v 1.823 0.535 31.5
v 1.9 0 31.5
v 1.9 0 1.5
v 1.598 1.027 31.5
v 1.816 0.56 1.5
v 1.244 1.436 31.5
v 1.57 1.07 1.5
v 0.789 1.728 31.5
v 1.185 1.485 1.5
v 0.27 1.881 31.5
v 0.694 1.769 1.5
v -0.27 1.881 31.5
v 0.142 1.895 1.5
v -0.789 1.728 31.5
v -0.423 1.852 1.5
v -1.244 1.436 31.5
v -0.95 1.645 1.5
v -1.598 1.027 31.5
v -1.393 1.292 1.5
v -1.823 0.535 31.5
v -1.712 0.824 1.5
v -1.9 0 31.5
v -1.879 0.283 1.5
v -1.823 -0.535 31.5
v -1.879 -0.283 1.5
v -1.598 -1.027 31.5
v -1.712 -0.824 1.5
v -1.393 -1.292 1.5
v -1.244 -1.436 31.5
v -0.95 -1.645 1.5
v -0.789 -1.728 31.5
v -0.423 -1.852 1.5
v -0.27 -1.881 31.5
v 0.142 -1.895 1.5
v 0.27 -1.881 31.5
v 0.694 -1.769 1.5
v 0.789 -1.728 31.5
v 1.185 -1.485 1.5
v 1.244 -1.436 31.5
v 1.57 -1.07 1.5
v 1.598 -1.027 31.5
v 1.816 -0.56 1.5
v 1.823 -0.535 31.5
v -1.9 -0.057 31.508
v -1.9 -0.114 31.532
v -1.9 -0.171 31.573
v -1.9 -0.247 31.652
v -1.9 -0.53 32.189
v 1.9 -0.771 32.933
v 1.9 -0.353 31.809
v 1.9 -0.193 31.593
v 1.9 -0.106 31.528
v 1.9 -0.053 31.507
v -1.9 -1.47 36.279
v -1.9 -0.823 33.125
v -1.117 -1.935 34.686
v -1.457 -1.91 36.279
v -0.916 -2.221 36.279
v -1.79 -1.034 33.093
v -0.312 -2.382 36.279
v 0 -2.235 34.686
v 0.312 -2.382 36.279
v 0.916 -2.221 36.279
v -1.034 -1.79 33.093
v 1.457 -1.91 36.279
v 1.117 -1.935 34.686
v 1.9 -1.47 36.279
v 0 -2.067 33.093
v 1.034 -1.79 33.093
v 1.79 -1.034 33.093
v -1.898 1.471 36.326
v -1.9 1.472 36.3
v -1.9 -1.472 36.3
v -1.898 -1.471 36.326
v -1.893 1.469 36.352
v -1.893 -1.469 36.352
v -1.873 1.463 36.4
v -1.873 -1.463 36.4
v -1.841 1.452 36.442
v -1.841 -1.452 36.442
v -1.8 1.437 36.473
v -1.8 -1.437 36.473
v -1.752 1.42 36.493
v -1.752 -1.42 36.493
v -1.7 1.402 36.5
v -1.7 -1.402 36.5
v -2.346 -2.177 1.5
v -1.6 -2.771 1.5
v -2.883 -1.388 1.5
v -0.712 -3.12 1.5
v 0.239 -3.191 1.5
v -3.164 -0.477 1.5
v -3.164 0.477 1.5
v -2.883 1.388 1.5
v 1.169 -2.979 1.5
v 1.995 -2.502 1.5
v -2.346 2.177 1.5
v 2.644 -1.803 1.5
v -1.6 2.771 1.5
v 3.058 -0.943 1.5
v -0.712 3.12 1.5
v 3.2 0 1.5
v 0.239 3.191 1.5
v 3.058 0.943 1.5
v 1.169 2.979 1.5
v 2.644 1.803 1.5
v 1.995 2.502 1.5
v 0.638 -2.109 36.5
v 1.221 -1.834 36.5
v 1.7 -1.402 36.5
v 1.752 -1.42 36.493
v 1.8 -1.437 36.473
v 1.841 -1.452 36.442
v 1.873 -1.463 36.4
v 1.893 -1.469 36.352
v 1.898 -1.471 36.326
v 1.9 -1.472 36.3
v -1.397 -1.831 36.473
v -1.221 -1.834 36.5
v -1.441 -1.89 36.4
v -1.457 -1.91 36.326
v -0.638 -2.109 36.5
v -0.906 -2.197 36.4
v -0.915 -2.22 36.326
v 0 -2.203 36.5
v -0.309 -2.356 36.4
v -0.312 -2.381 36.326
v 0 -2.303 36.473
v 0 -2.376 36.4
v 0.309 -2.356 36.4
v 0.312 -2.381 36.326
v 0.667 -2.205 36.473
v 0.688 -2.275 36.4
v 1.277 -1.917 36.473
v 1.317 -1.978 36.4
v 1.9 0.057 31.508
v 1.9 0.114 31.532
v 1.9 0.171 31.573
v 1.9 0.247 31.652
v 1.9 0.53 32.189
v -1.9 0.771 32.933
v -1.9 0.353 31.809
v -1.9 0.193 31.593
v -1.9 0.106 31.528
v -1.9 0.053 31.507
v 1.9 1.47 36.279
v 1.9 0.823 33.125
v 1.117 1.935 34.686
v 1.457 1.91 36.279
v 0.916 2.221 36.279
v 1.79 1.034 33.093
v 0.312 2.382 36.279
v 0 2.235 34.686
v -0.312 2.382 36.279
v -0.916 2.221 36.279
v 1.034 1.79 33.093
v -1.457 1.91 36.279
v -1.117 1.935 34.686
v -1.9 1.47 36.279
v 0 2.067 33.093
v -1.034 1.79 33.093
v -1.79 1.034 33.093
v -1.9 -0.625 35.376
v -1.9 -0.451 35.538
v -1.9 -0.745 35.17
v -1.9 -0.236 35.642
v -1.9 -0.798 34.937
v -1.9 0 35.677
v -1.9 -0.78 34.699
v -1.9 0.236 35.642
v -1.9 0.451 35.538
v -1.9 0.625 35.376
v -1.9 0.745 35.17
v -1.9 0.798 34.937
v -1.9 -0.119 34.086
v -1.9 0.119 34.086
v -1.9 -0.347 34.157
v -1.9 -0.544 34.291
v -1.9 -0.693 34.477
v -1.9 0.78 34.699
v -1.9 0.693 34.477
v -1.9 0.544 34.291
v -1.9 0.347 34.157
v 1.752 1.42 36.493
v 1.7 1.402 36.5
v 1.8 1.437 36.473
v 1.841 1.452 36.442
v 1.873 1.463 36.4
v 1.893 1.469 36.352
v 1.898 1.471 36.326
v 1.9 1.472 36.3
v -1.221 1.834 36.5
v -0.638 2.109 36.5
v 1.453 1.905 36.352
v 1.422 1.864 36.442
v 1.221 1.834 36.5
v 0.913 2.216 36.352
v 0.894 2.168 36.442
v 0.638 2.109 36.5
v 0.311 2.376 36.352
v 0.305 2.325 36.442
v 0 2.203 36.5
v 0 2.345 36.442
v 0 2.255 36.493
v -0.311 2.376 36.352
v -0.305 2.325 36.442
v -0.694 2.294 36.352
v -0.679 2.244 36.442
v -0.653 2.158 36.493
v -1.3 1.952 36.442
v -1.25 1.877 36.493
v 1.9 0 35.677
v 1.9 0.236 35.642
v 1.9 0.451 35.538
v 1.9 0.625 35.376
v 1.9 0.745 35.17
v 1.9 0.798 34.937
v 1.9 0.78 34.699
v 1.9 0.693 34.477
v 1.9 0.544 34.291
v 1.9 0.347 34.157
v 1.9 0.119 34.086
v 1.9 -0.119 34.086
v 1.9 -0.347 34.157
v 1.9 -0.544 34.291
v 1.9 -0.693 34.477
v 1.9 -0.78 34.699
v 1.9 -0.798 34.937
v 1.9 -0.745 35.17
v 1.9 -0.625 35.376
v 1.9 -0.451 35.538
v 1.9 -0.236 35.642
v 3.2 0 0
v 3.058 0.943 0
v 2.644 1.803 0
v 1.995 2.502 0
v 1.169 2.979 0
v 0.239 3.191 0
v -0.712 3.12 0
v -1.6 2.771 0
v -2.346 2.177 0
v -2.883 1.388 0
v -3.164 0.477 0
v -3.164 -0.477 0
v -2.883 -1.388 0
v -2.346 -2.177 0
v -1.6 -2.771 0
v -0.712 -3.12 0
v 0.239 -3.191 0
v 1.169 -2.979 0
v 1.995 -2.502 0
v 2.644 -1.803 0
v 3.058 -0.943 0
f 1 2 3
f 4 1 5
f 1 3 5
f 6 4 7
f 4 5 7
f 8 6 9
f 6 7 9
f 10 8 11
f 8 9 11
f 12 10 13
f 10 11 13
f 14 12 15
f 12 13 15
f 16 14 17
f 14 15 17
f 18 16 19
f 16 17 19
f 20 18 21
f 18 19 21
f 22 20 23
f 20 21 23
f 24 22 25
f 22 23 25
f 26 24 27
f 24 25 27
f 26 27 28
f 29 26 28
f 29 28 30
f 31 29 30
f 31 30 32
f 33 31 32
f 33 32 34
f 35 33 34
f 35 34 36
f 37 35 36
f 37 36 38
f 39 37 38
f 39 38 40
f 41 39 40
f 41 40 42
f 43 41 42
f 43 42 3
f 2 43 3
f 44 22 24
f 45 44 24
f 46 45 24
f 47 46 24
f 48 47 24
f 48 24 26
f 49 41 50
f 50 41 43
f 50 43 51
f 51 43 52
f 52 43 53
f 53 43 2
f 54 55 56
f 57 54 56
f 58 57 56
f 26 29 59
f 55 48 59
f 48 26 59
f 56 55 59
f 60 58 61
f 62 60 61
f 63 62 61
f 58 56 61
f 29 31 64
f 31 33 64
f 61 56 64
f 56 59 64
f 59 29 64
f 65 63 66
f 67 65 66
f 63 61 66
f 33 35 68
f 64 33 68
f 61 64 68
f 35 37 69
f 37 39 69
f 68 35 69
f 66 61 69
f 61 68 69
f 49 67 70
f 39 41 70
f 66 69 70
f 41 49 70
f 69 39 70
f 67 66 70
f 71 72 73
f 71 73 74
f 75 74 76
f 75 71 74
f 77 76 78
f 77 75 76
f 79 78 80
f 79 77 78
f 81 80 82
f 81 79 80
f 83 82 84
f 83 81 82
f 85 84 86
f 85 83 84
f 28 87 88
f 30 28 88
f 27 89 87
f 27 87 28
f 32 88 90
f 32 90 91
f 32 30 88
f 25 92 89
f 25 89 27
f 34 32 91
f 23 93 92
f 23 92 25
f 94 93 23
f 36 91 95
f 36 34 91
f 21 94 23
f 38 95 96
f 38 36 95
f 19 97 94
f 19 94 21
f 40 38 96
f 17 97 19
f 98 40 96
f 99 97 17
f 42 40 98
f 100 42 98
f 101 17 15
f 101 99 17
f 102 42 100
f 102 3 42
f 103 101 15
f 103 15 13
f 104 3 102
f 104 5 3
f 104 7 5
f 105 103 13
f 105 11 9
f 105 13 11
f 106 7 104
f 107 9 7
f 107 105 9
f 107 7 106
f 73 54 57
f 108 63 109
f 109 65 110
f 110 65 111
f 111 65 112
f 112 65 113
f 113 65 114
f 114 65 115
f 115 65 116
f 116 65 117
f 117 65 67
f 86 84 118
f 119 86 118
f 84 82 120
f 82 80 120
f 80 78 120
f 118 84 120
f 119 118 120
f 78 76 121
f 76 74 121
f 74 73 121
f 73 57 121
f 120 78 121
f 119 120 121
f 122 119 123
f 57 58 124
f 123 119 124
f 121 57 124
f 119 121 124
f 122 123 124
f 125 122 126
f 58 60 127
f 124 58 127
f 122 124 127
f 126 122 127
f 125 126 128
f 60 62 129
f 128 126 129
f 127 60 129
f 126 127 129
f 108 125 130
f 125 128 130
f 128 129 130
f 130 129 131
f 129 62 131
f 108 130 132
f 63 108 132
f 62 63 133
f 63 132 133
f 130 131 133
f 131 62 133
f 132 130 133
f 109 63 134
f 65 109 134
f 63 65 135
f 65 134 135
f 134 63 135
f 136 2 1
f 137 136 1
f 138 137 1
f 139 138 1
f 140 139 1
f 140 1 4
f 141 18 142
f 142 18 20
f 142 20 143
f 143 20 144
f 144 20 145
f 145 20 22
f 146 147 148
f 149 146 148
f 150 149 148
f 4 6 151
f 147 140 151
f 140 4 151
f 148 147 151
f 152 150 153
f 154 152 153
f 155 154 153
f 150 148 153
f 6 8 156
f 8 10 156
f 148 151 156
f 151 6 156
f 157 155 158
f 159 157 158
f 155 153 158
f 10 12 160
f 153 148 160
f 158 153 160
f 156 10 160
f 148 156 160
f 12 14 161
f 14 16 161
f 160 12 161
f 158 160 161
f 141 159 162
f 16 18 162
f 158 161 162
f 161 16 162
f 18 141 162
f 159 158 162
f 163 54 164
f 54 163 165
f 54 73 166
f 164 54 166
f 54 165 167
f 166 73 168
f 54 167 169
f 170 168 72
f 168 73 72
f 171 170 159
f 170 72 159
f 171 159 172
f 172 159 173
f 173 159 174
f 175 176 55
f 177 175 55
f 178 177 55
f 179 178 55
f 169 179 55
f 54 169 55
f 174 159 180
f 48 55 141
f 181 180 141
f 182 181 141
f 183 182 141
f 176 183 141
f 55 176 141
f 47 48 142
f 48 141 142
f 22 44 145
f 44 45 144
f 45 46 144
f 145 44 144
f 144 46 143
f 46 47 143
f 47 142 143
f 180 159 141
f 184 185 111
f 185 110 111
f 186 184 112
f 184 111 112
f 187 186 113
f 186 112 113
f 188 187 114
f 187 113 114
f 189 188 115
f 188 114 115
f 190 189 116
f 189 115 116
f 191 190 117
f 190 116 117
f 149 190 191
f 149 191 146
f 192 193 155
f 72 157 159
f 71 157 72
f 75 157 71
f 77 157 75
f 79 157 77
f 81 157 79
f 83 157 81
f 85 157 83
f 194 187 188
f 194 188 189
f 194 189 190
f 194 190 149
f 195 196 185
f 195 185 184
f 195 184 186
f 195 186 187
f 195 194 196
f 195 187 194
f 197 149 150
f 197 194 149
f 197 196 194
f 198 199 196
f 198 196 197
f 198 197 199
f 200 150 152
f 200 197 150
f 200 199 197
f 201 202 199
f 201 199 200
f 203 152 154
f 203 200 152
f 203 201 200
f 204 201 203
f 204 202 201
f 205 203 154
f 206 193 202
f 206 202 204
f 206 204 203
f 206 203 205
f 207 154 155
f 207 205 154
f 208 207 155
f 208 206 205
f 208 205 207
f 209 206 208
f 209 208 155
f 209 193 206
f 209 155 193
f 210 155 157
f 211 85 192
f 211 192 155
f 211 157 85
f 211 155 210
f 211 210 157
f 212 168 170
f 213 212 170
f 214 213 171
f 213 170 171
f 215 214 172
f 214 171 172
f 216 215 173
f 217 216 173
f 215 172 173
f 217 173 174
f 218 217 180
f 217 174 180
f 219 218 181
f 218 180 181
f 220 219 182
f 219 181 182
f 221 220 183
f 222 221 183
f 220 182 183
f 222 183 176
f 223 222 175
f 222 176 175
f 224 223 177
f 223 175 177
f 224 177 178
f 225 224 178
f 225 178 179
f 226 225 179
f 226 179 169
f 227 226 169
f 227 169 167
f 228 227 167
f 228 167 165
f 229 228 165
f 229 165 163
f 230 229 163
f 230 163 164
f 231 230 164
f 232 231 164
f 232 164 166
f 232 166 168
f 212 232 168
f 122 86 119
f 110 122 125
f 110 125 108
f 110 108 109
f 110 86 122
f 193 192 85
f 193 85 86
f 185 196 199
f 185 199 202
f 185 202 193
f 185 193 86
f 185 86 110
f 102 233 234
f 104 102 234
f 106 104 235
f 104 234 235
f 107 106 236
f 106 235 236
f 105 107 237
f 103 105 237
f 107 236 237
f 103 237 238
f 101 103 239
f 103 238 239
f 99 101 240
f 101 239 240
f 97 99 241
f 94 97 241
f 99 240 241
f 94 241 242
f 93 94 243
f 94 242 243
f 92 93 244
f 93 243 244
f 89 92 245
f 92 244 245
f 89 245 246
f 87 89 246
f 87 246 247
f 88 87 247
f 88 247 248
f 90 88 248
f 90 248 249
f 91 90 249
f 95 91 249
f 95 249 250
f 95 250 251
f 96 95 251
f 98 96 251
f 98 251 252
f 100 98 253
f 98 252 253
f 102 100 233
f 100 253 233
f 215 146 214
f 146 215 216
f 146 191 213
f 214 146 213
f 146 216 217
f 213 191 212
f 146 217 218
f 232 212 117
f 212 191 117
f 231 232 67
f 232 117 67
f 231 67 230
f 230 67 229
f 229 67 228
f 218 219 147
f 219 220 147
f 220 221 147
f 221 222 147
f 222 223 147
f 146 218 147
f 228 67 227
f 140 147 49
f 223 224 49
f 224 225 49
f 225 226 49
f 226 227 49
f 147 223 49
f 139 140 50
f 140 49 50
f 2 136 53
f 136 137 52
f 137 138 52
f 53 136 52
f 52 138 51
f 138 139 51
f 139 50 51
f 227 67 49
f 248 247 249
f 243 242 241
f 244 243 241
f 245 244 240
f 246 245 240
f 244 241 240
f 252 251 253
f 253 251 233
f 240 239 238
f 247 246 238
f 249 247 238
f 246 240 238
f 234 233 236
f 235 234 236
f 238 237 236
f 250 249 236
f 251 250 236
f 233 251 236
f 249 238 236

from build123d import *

# Parameters (mm, degrees)
SKETCH_1_R          = 3.2
EXTRUDE_1_DEPTH     = 1.5
SKETCH_2_R          = 1.9
EXTRUDE_2_DEPTH     = 30
SKETCH_4_R          = 1.9
EXTRUDE_3_DEPTH     = 5
EXTRUDE_3_DRAFT     = -6
SKETCH_5_W          = 1.201314004
SKETCH_5_H          = 17.589809259
CUT_EXTRUDE_4_DEPTH = 17.5
SKETCH_6_R          = 0.8
CUT_EXTRUDE_5_DEPTH = 37.993242626
FILLET_1_R          = 0.2


with BuildPart() as part:
    # Эскиз1 → Вытянуть1 (new body)
    with BuildSketch(Plane.XY):
        Circle(SKETCH_1_R)
    extrude(amount=EXTRUDE_1_DEPTH)

    # Эскиз2 → Вытянуть2 (add)
    with BuildSketch(Plane.XY.offset(1.5)):
        Circle(SKETCH_2_R)
    extrude(amount=EXTRUDE_2_DEPTH)


with BuildPart() as extrude_3_tool:
    # Эскиз4 → Вытянуть3 (with draft: the straight prism first)
    with BuildSketch(Plane.XY.offset(31.5)):
        Circle(SKETCH_4_R)
    extrude(amount=EXTRUDE_3_DEPTH)
    # Вытянуть3: the draft: its side faces are tilted about the plane it starts from
    extrude_3_sides = [extrude_3_tool.faces().sort_by_distance(p)[0] for p in [
        (-1.9, 0, 34),
    ]]
    draft(extrude_3_sides, Plane.XY.offset(31.5), EXTRUDE_3_DRAFT)


with BuildPart() as part_1:
    add(part.part)

    # Вытянуть3: add extrude_3_tool
    add(extrude_3_tool.part)

    # Эскиз5 → Вытянуть4 (cut, symmetric)
    with BuildSketch(Plane(origin=(0, 0, 0), x_dir=(1, 0, 0), z_dir=(0, 1, 0))):
        with Locations((2.500657002, -40.29490463)):
            Rectangle(SKETCH_5_W, SKETCH_5_H)
        with Locations((-2.500657002, -40.29490463)):
            Rectangle(SKETCH_5_W, SKETCH_5_H)
    extrude(amount=CUT_EXTRUDE_4_DEPTH, both=True, mode=Mode.SUBTRACT)

    # Эскиз6 → Вытянуть5 (cut, through all)
    with BuildSketch(Plane.ZY.offset(1.9)):
        with Locations((34.877288216, 0)):
            Circle(SKETCH_6_R)
    extrude(amount=-CUT_EXTRUDE_5_DEPTH, mode=Mode.SUBTRACT)

    # Скругление1
    fillet_1_edges = [part_1.edges().sort_by_distance(p)[0] for p in [
        (0, 2.425521176, 36.5),
        (0, -2.425521176, 36.5),
        (1.9, 0, 36.5),
        (-1.9, 0, 36.5),
    ]]
    fillet(fillet_1_edges, radius=FILLET_1_R)


solid = part_1.part
